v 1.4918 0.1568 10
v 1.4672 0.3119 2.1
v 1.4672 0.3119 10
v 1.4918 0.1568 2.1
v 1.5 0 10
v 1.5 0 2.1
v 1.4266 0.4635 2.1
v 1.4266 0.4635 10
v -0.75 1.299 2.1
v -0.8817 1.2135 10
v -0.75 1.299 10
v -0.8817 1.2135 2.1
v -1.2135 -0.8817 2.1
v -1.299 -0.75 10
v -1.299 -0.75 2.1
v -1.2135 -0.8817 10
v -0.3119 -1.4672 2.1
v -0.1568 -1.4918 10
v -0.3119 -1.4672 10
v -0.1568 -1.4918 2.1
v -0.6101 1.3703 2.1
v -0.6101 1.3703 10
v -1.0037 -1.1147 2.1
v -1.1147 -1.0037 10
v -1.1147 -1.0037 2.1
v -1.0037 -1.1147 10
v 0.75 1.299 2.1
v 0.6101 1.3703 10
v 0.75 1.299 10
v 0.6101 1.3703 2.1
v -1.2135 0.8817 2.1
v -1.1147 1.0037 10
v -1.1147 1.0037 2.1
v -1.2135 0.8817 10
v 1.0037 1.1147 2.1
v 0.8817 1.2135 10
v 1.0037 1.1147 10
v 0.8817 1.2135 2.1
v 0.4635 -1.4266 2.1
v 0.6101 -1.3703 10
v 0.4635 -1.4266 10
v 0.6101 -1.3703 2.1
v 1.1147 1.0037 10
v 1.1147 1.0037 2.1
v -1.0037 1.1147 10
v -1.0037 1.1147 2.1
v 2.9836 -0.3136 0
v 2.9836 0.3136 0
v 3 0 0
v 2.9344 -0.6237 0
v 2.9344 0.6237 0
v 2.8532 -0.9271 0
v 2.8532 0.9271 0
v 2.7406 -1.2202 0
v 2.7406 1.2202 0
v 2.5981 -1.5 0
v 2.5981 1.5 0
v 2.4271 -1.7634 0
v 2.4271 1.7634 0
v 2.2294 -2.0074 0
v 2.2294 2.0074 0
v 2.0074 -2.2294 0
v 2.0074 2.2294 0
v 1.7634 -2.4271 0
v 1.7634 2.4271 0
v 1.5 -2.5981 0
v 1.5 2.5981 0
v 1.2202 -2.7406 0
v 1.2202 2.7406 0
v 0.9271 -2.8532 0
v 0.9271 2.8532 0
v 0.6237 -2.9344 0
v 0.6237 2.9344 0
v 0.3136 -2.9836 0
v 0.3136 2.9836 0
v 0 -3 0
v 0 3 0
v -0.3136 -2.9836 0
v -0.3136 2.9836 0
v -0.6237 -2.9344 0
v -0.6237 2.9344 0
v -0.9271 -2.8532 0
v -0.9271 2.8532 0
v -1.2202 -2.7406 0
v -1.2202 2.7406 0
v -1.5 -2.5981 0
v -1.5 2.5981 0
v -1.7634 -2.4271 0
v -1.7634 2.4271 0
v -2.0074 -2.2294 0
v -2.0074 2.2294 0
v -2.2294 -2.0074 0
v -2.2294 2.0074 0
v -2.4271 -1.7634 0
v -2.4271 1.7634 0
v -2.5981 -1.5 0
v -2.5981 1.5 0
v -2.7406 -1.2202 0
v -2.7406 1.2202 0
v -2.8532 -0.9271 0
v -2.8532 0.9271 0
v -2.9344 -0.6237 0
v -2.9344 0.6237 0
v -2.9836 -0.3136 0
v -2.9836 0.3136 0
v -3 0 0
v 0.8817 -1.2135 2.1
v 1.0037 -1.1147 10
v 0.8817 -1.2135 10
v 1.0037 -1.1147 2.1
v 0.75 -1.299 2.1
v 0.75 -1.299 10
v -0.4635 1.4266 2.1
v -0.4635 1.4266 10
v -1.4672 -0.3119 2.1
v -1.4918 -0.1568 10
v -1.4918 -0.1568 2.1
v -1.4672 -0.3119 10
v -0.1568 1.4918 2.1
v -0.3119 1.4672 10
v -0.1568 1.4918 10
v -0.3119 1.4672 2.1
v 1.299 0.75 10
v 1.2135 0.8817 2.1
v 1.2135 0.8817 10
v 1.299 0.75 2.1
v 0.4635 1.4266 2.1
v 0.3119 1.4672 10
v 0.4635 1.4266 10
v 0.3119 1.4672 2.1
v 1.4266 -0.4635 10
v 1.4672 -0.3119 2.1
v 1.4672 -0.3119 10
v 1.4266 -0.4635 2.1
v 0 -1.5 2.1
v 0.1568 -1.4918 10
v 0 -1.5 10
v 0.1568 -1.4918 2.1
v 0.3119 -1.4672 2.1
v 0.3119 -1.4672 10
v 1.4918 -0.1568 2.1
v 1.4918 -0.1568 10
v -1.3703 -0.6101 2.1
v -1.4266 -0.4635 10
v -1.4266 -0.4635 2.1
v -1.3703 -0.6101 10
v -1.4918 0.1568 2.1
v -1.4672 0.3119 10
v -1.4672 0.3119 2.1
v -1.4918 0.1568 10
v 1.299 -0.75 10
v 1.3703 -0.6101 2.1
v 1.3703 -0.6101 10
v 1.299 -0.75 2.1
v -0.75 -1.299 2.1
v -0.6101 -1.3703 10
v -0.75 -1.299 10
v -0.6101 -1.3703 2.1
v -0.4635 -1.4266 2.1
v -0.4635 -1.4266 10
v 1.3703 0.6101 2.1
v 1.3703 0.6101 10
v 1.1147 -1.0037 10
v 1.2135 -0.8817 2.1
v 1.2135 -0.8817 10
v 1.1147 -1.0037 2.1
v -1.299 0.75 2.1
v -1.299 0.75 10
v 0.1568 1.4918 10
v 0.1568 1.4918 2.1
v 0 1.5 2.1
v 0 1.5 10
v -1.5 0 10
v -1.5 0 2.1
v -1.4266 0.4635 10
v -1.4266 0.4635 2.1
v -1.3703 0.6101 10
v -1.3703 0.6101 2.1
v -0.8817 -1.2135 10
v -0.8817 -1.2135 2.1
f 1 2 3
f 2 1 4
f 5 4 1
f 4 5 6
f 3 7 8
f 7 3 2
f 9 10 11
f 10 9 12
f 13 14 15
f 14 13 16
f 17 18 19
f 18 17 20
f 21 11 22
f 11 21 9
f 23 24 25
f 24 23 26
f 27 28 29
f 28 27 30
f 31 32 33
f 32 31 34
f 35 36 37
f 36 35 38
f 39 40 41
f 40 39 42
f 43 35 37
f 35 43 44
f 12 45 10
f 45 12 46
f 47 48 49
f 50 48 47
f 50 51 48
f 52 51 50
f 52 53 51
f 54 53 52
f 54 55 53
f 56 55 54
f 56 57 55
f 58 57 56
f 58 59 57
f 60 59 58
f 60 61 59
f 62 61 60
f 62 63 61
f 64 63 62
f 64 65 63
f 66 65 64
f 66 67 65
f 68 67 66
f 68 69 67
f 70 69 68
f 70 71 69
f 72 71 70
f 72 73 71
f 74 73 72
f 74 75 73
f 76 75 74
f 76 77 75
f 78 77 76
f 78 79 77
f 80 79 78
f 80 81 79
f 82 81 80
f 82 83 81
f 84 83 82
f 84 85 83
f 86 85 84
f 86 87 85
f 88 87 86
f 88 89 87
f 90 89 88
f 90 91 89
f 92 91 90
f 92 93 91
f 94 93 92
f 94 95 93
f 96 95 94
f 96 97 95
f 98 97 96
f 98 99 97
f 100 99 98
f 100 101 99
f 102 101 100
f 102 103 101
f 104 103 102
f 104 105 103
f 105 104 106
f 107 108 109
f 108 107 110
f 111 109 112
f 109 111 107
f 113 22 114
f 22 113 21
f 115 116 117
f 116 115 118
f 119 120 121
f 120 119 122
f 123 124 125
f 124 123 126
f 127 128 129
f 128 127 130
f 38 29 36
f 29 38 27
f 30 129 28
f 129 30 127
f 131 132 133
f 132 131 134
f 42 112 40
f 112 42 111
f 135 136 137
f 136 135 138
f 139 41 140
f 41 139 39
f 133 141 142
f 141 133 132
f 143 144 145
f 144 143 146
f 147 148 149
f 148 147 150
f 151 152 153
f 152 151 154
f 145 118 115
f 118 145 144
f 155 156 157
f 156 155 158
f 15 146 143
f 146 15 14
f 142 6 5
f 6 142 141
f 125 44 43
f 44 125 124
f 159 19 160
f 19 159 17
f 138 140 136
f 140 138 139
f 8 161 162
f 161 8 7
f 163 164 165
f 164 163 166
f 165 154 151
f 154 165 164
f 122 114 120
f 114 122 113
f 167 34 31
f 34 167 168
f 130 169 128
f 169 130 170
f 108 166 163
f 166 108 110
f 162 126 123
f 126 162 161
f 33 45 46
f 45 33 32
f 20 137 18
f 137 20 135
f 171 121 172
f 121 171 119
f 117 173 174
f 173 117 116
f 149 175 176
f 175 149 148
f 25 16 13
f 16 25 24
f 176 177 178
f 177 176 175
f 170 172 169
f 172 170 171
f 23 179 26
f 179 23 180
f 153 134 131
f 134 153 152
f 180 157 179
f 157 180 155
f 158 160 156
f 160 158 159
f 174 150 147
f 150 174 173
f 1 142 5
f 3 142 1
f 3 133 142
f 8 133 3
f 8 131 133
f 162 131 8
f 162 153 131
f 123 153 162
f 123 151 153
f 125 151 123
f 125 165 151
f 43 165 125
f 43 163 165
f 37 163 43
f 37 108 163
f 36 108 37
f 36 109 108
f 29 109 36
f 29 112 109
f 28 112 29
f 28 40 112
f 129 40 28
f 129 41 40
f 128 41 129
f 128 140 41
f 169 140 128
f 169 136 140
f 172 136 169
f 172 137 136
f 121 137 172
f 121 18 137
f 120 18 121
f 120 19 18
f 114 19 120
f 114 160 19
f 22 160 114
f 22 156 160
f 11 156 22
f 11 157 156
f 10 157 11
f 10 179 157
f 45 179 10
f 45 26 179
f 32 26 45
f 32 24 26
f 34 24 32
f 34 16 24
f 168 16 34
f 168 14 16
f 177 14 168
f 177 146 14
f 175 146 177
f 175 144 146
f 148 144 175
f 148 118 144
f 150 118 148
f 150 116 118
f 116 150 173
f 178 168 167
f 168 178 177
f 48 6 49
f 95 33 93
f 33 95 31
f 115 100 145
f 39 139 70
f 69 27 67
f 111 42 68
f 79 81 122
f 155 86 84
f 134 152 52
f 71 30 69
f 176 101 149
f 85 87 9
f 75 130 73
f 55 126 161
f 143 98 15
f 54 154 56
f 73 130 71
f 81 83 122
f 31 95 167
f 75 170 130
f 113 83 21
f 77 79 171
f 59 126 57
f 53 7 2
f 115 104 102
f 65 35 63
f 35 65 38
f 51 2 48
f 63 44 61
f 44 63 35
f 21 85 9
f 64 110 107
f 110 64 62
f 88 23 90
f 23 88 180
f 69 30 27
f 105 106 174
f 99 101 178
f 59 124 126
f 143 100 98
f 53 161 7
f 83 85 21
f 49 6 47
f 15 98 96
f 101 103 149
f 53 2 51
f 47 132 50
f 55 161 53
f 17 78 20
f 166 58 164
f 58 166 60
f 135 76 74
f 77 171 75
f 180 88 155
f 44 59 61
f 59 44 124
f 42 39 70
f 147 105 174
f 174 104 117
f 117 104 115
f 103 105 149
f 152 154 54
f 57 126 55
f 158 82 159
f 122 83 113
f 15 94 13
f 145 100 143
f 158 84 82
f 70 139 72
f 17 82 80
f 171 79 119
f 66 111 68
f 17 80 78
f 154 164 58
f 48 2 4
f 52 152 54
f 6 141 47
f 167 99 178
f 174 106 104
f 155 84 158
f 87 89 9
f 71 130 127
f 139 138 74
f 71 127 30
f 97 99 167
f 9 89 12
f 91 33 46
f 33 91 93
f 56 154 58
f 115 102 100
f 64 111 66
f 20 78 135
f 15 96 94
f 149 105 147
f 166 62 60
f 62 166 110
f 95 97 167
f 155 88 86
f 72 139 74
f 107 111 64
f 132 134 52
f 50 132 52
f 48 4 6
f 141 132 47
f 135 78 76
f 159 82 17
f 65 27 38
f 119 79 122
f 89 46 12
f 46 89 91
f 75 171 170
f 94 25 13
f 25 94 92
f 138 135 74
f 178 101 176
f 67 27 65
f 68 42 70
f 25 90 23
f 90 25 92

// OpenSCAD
// Solid rivet.
$fn = 60;
eps = 0.02;
shank_d = 3;
head_d = 6;
length = 10;
union() { cylinder(d=shank_d,h=length); cylinder(d1=head_d,d2=shank_d,h=head_d*0.35); }
